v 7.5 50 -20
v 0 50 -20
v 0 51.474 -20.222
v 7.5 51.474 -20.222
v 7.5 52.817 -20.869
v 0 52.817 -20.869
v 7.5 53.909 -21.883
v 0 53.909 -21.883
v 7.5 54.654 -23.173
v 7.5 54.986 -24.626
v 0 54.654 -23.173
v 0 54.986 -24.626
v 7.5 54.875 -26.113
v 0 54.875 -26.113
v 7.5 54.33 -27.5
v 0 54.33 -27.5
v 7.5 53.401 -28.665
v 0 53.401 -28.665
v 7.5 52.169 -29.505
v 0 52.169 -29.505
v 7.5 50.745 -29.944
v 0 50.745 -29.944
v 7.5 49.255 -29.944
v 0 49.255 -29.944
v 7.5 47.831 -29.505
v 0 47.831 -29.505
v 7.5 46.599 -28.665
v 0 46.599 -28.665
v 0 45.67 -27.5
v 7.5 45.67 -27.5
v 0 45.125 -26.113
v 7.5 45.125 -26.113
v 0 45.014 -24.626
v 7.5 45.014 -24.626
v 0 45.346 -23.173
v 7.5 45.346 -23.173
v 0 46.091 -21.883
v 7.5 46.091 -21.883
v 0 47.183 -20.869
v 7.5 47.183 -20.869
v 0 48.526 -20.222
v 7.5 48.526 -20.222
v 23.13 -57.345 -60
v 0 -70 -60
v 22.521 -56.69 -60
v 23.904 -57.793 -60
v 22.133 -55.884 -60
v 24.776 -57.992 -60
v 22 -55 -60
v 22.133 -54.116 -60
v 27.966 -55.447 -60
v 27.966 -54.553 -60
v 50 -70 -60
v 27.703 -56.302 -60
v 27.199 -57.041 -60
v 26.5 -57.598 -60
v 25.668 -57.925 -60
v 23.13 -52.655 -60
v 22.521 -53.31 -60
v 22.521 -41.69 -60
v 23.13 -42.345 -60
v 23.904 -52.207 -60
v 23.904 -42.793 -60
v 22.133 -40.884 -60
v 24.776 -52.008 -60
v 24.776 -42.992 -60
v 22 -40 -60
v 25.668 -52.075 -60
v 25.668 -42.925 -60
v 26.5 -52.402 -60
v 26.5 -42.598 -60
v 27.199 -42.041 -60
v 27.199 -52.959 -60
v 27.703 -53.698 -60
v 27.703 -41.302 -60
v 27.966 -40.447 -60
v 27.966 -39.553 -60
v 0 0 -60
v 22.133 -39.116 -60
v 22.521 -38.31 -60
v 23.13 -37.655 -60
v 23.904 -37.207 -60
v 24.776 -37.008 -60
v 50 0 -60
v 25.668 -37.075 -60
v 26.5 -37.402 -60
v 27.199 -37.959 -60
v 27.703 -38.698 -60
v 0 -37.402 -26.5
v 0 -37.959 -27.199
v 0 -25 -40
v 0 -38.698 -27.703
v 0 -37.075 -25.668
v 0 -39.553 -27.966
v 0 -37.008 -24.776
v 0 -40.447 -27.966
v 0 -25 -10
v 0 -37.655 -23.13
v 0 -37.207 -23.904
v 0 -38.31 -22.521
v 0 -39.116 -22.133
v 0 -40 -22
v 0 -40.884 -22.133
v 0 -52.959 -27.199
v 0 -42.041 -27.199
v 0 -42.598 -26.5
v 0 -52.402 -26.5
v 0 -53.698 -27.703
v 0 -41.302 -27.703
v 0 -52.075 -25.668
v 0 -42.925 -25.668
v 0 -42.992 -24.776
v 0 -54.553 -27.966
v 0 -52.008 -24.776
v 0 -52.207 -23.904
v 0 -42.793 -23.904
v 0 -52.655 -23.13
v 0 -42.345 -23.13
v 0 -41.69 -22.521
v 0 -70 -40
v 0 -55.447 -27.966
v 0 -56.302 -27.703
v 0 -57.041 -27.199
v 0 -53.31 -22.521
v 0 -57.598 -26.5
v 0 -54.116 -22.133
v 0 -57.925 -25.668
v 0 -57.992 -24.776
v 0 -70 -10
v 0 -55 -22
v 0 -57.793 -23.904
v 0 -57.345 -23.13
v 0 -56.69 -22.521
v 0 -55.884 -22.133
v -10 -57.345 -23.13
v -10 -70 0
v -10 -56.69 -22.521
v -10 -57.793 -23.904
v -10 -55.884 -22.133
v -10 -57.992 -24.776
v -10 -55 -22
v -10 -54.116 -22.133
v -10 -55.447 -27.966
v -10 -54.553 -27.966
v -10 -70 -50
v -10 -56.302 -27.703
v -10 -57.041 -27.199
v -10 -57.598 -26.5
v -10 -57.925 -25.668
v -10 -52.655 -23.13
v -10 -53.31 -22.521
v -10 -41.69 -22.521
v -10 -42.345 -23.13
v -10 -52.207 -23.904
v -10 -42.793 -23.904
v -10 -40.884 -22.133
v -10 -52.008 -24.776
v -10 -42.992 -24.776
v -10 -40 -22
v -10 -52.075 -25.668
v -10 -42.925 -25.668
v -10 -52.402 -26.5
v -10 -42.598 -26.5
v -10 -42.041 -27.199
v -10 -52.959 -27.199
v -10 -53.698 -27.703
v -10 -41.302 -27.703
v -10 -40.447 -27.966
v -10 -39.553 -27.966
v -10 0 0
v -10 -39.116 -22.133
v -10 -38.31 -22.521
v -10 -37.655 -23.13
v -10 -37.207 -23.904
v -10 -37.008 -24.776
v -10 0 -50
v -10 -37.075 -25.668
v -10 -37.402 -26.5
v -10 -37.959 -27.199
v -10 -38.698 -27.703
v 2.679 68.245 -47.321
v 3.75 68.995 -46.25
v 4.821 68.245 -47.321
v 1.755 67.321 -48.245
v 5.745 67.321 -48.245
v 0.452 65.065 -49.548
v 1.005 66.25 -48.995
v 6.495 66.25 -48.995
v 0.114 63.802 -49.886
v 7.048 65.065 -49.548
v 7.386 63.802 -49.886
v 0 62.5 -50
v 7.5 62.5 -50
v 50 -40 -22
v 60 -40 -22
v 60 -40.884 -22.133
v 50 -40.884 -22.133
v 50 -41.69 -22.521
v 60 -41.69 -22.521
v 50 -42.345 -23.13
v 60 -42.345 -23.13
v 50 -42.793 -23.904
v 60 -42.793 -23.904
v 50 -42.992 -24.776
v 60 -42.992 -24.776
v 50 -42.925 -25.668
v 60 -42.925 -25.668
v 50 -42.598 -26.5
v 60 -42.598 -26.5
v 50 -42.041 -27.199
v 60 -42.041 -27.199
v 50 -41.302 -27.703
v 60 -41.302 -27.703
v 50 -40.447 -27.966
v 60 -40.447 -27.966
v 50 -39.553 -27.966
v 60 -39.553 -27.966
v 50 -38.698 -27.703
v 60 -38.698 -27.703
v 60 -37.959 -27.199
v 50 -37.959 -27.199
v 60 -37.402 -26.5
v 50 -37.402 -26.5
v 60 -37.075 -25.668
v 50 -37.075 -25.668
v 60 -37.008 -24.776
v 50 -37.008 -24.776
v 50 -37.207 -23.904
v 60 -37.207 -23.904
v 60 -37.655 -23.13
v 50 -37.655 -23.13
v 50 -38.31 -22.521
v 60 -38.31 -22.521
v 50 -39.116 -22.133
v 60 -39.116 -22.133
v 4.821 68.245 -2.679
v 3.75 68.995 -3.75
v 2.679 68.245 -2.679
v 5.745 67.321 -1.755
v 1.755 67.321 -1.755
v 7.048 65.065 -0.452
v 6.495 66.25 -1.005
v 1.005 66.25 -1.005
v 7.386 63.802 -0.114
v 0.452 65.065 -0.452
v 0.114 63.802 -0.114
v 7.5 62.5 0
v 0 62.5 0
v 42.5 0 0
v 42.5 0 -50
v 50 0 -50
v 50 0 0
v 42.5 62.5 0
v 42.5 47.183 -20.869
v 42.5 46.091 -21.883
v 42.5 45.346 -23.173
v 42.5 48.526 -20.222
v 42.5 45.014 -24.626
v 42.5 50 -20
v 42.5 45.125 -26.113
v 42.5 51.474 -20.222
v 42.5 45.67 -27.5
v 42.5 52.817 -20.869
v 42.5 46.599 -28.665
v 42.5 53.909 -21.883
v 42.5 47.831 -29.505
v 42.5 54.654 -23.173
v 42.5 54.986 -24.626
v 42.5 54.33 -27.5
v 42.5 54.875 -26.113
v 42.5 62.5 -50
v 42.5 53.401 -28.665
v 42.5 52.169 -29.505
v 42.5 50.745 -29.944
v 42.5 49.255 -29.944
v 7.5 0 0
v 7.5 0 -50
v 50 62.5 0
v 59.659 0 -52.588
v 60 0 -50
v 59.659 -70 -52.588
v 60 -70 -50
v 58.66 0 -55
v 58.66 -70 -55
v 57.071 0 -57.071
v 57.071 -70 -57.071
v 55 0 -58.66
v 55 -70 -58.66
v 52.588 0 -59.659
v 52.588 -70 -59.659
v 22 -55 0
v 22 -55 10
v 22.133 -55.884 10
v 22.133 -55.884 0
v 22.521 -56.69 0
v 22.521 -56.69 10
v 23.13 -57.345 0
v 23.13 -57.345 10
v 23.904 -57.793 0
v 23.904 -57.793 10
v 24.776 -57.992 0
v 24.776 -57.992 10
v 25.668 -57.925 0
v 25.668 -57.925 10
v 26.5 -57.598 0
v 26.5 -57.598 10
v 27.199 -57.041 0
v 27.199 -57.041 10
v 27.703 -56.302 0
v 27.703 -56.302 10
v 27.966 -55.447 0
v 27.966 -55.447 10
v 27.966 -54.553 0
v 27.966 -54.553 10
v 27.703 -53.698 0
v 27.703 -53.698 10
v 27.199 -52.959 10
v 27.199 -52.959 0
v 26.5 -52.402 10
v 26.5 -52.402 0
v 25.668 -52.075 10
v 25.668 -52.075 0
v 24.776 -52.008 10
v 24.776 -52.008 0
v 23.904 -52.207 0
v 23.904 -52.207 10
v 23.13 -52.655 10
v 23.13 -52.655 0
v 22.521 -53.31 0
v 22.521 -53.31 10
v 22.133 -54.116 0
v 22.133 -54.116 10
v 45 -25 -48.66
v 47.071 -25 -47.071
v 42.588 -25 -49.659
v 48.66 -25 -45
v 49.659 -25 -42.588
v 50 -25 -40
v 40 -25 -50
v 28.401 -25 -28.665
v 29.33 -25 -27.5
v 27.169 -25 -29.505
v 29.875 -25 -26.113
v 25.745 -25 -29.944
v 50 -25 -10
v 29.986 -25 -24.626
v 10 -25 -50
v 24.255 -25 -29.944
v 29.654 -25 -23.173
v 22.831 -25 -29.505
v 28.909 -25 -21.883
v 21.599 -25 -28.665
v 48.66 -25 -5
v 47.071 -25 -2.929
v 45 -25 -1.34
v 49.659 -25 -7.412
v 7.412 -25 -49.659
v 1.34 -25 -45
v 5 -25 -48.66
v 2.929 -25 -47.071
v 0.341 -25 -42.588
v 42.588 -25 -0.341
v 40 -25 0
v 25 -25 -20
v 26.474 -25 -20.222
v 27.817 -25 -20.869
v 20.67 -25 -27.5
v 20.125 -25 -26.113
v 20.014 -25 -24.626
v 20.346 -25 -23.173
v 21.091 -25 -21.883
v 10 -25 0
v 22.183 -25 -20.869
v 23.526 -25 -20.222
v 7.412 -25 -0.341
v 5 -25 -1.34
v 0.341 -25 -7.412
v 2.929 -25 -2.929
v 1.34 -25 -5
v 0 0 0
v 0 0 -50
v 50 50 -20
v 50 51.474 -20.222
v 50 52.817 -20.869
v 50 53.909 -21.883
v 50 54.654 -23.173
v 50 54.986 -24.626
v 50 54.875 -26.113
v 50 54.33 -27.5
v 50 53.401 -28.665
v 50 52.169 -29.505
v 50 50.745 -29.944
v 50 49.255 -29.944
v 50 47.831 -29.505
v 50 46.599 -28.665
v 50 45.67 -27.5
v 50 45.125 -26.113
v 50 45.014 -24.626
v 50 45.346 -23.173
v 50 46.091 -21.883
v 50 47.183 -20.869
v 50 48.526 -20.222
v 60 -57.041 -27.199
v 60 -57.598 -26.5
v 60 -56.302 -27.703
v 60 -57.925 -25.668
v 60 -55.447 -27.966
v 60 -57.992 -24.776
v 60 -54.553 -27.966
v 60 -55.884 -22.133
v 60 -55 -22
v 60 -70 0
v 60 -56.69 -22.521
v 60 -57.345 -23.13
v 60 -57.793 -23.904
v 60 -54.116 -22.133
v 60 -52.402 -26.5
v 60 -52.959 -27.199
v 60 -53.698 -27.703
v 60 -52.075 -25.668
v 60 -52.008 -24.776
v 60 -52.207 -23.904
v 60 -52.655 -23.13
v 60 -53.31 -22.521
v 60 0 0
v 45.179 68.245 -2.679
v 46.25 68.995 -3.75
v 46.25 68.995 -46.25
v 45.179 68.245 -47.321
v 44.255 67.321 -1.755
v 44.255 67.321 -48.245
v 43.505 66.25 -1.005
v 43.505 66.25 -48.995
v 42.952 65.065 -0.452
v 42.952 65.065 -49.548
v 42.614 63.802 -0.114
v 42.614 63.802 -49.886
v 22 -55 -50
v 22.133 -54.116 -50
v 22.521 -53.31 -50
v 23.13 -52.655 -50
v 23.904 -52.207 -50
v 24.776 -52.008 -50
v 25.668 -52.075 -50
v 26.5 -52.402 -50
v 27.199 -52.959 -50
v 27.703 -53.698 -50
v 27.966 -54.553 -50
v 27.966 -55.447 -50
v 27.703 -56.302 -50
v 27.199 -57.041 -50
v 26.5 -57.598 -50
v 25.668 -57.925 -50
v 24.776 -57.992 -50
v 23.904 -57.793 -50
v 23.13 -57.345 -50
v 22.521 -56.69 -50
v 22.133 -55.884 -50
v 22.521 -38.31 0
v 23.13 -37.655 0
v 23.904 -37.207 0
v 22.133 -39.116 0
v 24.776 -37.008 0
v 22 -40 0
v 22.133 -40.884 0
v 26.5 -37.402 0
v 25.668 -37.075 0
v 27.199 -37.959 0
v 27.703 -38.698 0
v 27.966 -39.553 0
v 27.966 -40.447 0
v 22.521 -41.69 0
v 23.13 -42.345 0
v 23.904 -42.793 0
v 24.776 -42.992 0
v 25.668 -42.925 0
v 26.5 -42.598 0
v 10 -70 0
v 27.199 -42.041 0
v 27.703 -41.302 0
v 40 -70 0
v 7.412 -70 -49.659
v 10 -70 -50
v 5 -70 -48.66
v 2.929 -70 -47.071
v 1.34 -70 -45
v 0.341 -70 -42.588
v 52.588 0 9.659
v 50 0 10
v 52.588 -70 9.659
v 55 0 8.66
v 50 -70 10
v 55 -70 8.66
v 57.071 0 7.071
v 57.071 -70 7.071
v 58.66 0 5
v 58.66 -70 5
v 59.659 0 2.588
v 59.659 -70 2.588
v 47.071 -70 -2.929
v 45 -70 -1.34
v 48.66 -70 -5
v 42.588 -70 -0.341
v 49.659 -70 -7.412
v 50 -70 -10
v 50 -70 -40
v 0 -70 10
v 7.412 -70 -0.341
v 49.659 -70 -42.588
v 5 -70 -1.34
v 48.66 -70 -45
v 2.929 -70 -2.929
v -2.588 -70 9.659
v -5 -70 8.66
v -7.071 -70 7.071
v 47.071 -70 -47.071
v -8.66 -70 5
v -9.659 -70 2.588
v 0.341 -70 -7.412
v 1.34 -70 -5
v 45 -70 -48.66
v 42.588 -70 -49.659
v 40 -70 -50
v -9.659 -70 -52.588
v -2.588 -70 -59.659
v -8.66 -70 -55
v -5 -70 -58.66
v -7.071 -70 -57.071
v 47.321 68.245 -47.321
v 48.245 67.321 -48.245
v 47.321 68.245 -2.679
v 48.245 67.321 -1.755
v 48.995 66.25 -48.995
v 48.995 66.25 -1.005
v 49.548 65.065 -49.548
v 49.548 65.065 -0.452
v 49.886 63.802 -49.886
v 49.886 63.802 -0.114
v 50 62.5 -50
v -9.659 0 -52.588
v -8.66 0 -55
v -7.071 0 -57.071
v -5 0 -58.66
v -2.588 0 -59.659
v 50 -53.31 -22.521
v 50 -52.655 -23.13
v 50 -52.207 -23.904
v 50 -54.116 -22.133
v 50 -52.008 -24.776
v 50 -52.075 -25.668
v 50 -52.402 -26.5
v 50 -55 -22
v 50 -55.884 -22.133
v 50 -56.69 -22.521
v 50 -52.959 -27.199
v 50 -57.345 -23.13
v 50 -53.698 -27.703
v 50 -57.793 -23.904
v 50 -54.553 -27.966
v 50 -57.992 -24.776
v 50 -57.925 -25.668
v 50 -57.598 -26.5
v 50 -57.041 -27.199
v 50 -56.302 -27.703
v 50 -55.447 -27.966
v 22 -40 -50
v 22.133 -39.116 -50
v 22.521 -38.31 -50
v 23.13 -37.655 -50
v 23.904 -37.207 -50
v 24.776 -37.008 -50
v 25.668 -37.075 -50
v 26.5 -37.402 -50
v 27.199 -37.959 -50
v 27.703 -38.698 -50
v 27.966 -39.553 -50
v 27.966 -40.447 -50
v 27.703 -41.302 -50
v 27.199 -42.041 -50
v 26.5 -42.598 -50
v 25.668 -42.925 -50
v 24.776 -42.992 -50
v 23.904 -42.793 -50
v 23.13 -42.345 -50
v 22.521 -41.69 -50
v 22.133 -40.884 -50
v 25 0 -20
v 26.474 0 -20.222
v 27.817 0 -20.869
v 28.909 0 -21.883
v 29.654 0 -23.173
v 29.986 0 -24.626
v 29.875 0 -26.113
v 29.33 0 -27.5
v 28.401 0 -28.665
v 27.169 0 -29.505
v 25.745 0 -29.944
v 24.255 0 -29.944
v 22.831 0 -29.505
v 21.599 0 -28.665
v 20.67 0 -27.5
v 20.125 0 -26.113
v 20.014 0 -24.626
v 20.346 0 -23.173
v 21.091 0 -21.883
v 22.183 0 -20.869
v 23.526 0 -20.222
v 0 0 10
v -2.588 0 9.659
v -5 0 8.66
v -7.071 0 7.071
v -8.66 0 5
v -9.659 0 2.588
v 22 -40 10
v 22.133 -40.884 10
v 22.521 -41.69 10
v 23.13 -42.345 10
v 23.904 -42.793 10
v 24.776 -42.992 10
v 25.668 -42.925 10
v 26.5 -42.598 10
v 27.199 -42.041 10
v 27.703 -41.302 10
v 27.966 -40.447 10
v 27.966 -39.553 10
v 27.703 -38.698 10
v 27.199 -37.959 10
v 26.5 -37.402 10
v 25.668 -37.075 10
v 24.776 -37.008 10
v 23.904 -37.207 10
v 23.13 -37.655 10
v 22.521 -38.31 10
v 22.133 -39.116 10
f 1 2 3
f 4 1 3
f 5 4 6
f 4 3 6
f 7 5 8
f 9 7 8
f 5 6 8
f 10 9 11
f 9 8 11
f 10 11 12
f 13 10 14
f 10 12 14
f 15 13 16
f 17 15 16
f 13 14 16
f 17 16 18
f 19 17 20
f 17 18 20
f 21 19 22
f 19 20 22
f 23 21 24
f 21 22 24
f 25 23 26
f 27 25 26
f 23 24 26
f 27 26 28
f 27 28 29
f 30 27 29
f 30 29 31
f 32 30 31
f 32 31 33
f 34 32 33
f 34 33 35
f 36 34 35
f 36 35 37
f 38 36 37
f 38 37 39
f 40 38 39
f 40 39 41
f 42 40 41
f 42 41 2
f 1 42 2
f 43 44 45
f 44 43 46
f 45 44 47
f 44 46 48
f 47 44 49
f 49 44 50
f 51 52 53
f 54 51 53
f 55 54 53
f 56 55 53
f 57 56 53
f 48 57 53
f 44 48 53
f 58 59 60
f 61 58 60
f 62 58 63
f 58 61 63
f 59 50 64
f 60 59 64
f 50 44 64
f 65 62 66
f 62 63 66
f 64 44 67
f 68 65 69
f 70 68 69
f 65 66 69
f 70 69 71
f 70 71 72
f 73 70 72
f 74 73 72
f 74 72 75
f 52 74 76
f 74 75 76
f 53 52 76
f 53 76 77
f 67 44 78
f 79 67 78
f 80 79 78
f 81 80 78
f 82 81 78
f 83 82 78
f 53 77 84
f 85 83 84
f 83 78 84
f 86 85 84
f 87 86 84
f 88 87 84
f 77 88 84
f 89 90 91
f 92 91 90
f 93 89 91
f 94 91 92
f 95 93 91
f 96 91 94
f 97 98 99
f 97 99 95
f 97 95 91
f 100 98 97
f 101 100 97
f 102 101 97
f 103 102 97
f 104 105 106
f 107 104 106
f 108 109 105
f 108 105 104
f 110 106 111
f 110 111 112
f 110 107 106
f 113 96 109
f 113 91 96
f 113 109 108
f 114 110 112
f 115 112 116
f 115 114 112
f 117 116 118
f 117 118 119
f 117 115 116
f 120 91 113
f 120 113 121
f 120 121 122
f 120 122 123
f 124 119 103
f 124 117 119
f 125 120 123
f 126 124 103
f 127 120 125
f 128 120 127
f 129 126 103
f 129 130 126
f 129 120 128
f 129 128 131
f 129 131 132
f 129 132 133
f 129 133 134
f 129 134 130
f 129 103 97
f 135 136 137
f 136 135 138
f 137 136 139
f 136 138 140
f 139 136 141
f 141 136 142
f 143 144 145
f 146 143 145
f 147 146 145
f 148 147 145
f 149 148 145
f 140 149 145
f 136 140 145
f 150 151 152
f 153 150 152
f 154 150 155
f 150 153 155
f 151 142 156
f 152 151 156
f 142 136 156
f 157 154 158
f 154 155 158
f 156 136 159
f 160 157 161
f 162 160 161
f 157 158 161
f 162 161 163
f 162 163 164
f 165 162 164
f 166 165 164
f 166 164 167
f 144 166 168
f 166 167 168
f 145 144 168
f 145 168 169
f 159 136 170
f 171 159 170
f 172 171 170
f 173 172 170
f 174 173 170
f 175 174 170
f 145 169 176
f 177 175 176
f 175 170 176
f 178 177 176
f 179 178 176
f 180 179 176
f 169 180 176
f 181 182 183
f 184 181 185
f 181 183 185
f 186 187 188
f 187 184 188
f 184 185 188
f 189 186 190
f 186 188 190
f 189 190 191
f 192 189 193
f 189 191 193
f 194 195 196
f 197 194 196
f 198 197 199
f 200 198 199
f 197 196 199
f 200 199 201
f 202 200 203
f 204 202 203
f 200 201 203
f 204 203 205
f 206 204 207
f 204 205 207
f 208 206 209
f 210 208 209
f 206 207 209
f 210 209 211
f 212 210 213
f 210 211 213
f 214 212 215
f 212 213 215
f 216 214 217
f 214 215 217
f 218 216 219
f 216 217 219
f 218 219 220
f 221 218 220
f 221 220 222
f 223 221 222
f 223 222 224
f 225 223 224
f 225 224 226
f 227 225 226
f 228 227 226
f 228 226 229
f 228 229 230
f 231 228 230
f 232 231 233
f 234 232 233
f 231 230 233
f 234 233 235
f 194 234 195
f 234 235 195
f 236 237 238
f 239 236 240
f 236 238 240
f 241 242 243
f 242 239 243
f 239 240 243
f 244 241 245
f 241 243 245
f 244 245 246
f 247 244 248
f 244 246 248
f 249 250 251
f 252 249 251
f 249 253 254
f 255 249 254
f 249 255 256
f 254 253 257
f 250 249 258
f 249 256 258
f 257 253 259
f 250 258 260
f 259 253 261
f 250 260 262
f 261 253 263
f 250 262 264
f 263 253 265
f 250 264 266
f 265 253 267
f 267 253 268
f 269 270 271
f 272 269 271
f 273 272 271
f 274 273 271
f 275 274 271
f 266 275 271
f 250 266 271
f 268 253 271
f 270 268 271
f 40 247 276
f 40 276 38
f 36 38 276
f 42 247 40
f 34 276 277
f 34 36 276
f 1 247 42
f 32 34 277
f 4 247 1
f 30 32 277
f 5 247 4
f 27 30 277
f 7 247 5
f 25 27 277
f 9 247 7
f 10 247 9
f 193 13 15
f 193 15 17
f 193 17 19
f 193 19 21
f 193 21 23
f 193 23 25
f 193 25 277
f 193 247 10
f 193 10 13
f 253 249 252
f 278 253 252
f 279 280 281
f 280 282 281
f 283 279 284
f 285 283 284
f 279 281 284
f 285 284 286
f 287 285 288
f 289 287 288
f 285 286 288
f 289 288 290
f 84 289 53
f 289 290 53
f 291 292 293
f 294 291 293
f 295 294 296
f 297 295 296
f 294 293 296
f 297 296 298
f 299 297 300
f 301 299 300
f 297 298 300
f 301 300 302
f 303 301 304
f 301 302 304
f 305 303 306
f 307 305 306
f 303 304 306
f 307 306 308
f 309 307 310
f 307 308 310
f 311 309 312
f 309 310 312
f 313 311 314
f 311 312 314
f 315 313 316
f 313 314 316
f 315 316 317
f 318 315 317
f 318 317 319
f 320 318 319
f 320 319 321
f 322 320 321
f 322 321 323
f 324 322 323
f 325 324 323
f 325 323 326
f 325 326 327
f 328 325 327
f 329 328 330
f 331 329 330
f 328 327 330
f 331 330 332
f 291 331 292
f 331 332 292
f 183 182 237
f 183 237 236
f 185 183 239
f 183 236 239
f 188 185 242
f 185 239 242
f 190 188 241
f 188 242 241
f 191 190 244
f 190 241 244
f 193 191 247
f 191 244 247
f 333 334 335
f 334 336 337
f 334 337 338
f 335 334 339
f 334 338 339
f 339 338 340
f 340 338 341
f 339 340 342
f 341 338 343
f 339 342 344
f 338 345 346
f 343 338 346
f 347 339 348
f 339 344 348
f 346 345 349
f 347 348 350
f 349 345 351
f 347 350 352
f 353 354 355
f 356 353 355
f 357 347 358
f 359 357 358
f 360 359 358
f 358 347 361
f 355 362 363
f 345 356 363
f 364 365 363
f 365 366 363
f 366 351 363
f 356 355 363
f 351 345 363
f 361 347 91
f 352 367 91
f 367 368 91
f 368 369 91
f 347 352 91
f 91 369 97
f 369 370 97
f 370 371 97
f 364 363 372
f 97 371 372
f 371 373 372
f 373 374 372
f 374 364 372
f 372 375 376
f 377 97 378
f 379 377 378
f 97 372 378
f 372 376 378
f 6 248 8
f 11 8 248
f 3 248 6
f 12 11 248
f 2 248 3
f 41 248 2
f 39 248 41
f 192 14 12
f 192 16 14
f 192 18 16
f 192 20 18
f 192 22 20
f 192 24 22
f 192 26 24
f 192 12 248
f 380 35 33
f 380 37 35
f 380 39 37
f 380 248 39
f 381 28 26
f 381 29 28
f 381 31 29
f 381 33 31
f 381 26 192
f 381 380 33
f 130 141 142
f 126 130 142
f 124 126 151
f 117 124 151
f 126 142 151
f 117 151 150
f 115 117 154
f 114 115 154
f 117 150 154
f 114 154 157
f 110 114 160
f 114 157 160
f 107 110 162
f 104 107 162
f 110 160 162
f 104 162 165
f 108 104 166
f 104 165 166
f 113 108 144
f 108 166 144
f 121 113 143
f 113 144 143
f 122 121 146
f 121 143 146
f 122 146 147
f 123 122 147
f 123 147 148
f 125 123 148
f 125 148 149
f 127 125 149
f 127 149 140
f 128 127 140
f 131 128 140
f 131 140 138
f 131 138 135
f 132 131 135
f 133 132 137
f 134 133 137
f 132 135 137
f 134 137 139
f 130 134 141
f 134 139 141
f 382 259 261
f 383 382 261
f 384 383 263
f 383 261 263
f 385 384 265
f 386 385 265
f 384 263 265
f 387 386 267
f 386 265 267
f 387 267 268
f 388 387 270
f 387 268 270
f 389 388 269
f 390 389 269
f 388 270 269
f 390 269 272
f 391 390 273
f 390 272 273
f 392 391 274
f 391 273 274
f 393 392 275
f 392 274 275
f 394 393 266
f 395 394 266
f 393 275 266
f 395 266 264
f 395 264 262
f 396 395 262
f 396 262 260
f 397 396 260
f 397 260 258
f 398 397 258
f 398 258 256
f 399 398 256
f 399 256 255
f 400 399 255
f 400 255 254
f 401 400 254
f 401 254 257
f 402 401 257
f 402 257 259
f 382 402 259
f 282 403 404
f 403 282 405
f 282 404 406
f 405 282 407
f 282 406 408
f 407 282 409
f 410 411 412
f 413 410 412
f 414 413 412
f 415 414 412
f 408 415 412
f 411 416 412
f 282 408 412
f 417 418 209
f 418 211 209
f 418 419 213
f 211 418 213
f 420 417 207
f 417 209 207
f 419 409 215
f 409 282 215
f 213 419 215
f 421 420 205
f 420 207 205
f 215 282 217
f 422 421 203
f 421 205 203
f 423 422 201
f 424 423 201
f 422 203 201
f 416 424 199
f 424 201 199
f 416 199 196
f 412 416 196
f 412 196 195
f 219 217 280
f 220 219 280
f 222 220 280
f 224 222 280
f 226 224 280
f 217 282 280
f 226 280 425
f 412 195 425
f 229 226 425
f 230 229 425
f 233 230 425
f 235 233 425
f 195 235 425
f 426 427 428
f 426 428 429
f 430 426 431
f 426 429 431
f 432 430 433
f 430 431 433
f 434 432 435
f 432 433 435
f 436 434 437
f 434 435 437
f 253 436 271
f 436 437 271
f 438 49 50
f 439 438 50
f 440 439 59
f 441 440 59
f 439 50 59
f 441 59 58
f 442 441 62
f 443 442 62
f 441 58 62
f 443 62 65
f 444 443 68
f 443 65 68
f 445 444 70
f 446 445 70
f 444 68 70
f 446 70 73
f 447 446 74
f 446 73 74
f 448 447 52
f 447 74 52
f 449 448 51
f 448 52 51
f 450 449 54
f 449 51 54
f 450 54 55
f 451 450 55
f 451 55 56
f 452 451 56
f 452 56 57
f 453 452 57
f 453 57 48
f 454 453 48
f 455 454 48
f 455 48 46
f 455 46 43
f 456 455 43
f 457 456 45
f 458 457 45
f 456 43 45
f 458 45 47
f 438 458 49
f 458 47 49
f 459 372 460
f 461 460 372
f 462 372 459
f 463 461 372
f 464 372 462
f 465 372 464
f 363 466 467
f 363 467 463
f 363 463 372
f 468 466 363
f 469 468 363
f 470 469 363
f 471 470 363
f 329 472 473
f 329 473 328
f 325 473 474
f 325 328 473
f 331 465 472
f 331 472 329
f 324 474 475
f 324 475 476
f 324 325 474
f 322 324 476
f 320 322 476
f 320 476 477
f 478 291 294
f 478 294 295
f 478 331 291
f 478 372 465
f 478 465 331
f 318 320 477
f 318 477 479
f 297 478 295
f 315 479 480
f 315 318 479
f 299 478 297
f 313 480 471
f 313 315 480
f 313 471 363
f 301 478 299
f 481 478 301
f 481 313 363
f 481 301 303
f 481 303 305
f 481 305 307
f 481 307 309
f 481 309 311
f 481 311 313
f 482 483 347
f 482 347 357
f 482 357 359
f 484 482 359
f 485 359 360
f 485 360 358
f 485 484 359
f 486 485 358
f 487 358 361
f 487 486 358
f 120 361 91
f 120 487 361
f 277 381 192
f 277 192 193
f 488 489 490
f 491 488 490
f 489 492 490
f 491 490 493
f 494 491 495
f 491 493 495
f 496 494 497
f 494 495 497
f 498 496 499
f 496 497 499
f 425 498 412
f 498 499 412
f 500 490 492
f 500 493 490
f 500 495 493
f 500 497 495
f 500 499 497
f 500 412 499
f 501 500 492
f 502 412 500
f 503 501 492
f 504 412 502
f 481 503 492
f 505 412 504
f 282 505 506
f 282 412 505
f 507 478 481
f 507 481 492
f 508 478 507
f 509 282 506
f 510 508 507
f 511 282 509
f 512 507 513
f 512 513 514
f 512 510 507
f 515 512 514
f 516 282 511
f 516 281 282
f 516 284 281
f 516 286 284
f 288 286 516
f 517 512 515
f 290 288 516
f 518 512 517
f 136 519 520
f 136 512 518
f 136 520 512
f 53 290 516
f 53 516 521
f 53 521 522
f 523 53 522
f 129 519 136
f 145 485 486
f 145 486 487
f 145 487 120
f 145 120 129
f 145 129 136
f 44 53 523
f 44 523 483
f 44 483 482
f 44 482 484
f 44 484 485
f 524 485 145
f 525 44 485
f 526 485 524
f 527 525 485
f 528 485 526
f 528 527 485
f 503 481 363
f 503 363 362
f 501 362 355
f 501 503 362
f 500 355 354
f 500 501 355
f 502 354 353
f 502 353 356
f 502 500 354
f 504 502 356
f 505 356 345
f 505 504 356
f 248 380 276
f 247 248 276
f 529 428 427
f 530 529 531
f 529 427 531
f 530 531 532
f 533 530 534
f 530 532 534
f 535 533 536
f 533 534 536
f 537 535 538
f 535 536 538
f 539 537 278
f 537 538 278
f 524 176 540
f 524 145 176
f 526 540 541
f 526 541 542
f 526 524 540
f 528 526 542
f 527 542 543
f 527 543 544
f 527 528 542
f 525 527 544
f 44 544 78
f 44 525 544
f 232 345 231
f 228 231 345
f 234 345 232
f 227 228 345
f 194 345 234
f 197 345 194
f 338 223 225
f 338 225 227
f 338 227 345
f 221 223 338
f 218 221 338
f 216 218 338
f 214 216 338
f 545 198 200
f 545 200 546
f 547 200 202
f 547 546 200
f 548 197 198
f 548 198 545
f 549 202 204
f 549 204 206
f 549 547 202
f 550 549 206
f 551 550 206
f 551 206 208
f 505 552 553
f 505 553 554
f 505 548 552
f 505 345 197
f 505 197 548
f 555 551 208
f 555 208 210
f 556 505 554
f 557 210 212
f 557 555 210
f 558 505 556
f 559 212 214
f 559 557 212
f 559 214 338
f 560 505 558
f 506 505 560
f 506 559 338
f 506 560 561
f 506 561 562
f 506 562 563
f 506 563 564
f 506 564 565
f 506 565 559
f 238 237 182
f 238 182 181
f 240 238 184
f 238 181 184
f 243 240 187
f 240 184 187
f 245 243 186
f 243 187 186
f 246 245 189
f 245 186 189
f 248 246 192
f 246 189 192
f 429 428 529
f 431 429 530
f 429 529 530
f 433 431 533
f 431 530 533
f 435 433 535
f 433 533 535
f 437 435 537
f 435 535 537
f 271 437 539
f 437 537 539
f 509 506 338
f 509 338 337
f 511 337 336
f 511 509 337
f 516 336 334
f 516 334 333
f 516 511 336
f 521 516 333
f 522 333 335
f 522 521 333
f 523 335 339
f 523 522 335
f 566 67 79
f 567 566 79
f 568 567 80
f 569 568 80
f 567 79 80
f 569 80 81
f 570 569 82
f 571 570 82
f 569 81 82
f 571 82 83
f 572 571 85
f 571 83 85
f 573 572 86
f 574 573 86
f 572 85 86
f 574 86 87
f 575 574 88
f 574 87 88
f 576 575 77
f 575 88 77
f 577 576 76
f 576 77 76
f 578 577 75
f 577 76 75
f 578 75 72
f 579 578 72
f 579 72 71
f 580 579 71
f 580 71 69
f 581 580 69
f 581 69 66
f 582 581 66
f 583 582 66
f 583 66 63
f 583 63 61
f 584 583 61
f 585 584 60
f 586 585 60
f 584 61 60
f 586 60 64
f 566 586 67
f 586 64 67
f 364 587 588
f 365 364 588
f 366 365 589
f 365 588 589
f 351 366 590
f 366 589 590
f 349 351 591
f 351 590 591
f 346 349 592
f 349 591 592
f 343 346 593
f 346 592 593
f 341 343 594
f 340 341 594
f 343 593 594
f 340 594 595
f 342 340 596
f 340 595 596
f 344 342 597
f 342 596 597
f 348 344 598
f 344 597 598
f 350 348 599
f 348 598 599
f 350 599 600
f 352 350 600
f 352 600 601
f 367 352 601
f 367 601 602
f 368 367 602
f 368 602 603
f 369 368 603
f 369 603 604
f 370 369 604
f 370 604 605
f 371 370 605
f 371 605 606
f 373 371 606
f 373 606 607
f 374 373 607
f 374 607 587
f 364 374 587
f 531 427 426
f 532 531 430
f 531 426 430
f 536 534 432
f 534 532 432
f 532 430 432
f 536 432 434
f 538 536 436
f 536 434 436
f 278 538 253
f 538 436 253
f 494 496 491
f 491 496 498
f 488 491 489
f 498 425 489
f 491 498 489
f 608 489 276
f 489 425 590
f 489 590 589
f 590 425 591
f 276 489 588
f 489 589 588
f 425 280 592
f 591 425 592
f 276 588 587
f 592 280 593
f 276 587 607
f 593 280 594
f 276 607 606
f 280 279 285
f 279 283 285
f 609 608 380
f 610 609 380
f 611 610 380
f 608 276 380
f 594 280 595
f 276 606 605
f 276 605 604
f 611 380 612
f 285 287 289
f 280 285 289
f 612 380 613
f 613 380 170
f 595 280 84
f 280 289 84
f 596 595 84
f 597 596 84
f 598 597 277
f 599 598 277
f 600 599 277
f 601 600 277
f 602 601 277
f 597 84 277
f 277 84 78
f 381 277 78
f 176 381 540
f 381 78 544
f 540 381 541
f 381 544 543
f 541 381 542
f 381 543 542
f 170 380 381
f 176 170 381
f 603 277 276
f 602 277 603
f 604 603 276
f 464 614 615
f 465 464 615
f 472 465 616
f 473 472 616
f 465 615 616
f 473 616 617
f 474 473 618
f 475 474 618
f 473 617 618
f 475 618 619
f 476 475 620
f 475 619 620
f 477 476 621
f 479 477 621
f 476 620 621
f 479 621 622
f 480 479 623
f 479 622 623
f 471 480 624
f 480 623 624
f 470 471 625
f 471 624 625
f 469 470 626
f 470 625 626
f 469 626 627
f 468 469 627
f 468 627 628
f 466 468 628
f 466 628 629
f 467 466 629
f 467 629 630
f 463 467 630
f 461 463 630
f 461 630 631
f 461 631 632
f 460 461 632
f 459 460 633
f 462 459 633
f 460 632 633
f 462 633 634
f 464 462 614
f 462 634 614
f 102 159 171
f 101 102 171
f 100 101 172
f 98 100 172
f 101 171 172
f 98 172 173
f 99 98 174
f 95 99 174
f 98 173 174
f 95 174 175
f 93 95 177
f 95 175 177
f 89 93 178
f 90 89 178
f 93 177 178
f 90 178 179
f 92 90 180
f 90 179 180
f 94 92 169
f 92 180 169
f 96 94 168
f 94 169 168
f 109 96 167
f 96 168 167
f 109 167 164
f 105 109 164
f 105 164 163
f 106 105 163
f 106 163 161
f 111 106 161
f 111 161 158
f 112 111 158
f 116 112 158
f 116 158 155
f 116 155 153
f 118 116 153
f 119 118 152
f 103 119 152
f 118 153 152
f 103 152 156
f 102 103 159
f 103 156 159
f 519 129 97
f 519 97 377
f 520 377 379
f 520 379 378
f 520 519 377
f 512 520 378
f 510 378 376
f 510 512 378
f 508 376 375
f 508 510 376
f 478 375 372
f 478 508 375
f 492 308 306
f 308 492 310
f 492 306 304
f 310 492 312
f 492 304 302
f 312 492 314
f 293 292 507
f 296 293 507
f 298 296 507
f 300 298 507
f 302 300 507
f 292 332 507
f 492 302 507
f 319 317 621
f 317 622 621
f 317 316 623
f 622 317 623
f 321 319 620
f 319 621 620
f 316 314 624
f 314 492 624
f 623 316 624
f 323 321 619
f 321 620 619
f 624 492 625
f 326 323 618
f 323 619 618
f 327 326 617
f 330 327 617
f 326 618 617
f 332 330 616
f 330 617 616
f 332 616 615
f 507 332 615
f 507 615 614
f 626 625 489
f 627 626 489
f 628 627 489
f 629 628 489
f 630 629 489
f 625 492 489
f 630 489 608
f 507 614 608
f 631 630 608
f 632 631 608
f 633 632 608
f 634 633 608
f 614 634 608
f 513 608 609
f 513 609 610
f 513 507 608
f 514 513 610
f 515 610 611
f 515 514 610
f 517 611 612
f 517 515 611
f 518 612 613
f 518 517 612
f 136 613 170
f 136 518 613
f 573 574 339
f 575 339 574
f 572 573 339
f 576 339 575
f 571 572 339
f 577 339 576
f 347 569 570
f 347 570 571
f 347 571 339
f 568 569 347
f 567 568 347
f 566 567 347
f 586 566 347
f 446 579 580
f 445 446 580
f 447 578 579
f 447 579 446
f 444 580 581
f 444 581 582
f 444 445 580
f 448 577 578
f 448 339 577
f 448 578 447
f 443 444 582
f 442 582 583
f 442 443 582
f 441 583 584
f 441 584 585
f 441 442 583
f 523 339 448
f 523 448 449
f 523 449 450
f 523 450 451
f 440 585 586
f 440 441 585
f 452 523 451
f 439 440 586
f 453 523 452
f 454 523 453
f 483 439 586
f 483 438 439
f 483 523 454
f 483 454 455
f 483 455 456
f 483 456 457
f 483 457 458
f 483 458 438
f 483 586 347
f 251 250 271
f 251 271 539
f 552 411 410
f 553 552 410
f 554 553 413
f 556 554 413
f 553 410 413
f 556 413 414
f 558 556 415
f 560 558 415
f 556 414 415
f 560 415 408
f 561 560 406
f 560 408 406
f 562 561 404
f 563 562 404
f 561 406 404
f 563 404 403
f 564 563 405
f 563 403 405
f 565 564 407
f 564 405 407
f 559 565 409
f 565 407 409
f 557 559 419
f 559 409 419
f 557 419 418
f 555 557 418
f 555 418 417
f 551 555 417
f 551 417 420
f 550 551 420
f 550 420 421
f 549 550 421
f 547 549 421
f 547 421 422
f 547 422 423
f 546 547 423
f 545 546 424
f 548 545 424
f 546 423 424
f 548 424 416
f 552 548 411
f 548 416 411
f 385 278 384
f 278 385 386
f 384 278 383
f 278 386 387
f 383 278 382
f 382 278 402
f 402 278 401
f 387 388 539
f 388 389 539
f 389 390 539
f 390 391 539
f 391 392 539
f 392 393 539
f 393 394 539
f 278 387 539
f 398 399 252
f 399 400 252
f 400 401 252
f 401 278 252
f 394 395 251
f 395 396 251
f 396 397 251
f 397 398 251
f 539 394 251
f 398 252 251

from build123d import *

# Parameters (mm, degrees)
SKETCH1_W           = 50
SKETCH1_H           = 50
BOSS_EXTRUDE1_DEPTH = 70
SKETCH3_W           = 35
SKETCH3_H           = 50
CUT_EXTRUDE1_DEPTH  = 120
SKETCH4_R           = 5
CUT_EXTRUDE2_DEPTH  = 14
FILLET2_R           = 7.5
BOSS_EXTRUDE2_DEPTH = 70
FILLET4_R           = 10
CUT_EXTRUDE10_DEPTH = 45
SKETCH10_R          = 3
CUT_EXTRUDE6_DEPTH  = 10
SKETCH12_R          = 3
CUT_EXTRUDE7_DEPTH  = 10
SKETCH13_R          = 3
CUT_EXTRUDE8_DEPTH  = 10
SKETCH14_R          = 3
CUT_EXTRUDE9_DEPTH  = 10
FILLET5_R           = 7.5
SKETCH16_R          = 5
CUT_EXTRUDE12_DEPTH = 10
SKETCH17_R          = 5
CUT_EXTRUDE13_DEPTH = 50


with BuildPart() as part:
    # Sketch1 → Boss-Extrude1 (new body)
    with BuildSketch(Plane(origin=(0, 0, 0), x_dir=(1, 0, 0), z_dir=(0, 1, 0))):
        with Locations((25, 25)):
            Rectangle(SKETCH1_W, SKETCH1_H)
    extrude(amount=BOSS_EXTRUDE1_DEPTH)

    # Sketch3 → Cut-Extrude1 (cut)
    with BuildSketch(Plane(origin=(0, 70, 0), x_dir=(1, 0, 0), z_dir=(0, 1, 0))):
        with Locations((25, 25)):
            Rectangle(SKETCH3_W, SKETCH3_H)
    extrude(amount=-CUT_EXTRUDE1_DEPTH, mode=Mode.SUBTRACT)


with BuildPart() as cut_extrude1_piece_1:
    # of the separate pieces the step leaves, piece 1, a body of its own (cut_extrude1_pieces)
    add(part.part.solids().sort_by_distance((42.5, 0, 0))[0])

    # Fillet2
    # the kernel refuses this fillet: 7.5 mm, written as the material it takes off along each edge
    with BuildSketch(Plane(origin=(50, 70, 18.75), x_dir=(0, -1, 0), z_dir=(0, 0, -1))) as fillet2_piece_1:
        with BuildLine():
            CenterArc((FILLET2_R, FILLET2_R), FILLET2_R, 180, 90)
            Line((0, FILLET2_R), (0, 0))
            Line((0, 0), (FILLET2_R, 0))
        make_face()
    extrude(amount=87.5, mode=Mode.SUBTRACT)
    with BuildSketch(Plane(origin=(23.75, 70, 0), x_dir=(0, -1, 0), z_dir=(1, 0, 0))) as fillet2_piece_2:
        with BuildLine():
            CenterArc((FILLET2_R, FILLET2_R), FILLET2_R, 180, 90)
            Line((0, FILLET2_R), (0, 0))
            Line((0, 0), (FILLET2_R, 0))
        make_face()
    extrude(amount=45, mode=Mode.SUBTRACT)
    with BuildSketch(Plane(origin=(68.75, 70, -50), x_dir=(0, 0, 1), z_dir=(-1, 0, 0))) as fillet2_piece_3:
        with BuildLine():
            CenterArc((FILLET2_R, -FILLET2_R), FILLET2_R, 90, 90)
            Line((0, -FILLET2_R), (0, 0))
            Line((0, 0), (FILLET2_R, 0))
        make_face()
    extrude(amount=45, mode=Mode.SUBTRACT)
    with BuildSketch(Plane(origin=(42.5, 70, -68.75), x_dir=(1, 0, 0), z_dir=(0, 0, 1))) as fillet2_piece_4:
        with BuildLine():
            CenterArc((FILLET2_R, -FILLET2_R), FILLET2_R, 90, 90)
            Line((0, -FILLET2_R), (0, 0))
            Line((0, 0), (FILLET2_R, 0))
        make_face()
    extrude(amount=87.5, mode=Mode.SUBTRACT)

    # Sketch16 → Cut-Extrude12 (cut)
    with BuildSketch(Plane.ZY.offset(-42.5)):
        with Locations((-25, 50)):
            Circle(SKETCH16_R)
    extrude(amount=-CUT_EXTRUDE12_DEPTH, mode=Mode.SUBTRACT)


with BuildPart() as cut_extrude1_piece_2:
    # of the separate pieces the step leaves, piece 2, a body of its own (cut_extrude1_pieces)
    add(part.part.solids().sort_by_distance((0, 0, 0))[0])

    # Sketch4 → Cut-Extrude2 (cut)
    with BuildSketch(Plane.ZY):
        with Locations((-25, 50)):
            Circle(SKETCH4_R)
    extrude(amount=-CUT_EXTRUDE2_DEPTH, mode=Mode.SUBTRACT)

    # Sketch6 → Boss-Extrude2 (add)
    with BuildSketch(Plane(origin=(0, 0, 0), x_dir=(-1, 0, 0), z_dir=(0, -1, 0))):
        Polygon((-60, 0), (-60, -10), (10, -10), (10, 60), (-60, 60), align=None)
    extrude(amount=BOSS_EXTRUDE2_DEPTH)

    # Fillet4
    fillet4_edges = [cut_extrude1_piece_2.edges().sort_by_distance(p)[0] for p in [
        (60, -35, -60),
        (60, -35, 10),
        (-10, -35, 10),
        (-10, -35, -60),
    ]]
    fillet(fillet4_edges, radius=FILLET4_R)

    # Sketch15 → Cut-Extrude10 (cut)
    with BuildSketch(Plane.XZ.offset(70)):
        with BuildLine():
            Line((10, 0), (40, 0))
            ThreePointArc((40, 0), (47.071067812, -2.928932188), (50, -10))
            Line((50, -10), (50, -40))
            ThreePointArc((50, -40), (47.071067812, -47.071067812), (40, -50))
            Line((40, -50), (10, -50))
            ThreePointArc((10, -50), (2.928932188, -47.071067812), (0, -40))
            Line((0, -40), (0, -10))
            ThreePointArc((0, -10), (2.928932188, -2.928932188), (10, 0))
        make_face()
    extrude(amount=-CUT_EXTRUDE10_DEPTH, mode=Mode.SUBTRACT)

    # Sketch10 → Cut-Extrude6 (cut)
    with BuildSketch(Plane.ZY.offset(10)):
        with Locations((-25, -40)):
            Circle(SKETCH10_R)
        with Locations((-25, -55)):
            Circle(SKETCH10_R)
    extrude(amount=-CUT_EXTRUDE6_DEPTH, mode=Mode.SUBTRACT)

    # Sketch12 → Cut-Extrude7 (cut)
    with BuildSketch(Plane(origin=(0, 0, -60), x_dir=(-1, 0, 0), z_dir=(0, 0, -1))):
        with Locations((-25, -40)):
            Circle(SKETCH12_R)
        with Locations((-25, -55)):
            Circle(SKETCH12_R)
    extrude(amount=-CUT_EXTRUDE7_DEPTH, mode=Mode.SUBTRACT)

    # Sketch13 → Cut-Extrude8 (cut)
    with BuildSketch(Plane(origin=(60, 0, 0), x_dir=(0, 0, -1), z_dir=(1, 0, 0))):
        with Locations(Location((25, -40, 0), (0, 0, 180))):
            Circle(SKETCH13_R)
        with Locations(Location((25, -55, 0), (0, 0, 180))):
            Circle(SKETCH13_R)
    extrude(amount=-CUT_EXTRUDE8_DEPTH, mode=Mode.SUBTRACT)

    # Sketch14 → Cut-Extrude9 (cut)
    with BuildSketch(Plane.XY.offset(10)):
        with Locations(Location((25, -40, 0), (0, 0, 180))):
            Circle(SKETCH14_R)
        with Locations(Location((25, -55, 0), (0, 0, 180))):
            Circle(SKETCH14_R)
    extrude(amount=-CUT_EXTRUDE9_DEPTH, mode=Mode.SUBTRACT)

    # Fillet5
    # the kernel refuses this fillet: 7.5 mm, written as the material it takes off along each edge
    with BuildSketch(Plane(origin=(26.25, 70, -50), x_dir=(0, -1, 0), z_dir=(-1, 0, 0)), Plane(origin=(-18.75, 70, 0), x_dir=(0, -1, 0), z_dir=(1, 0, 0))) as fillet5_piece_1:
        with BuildLine():
            CenterArc((FILLET5_R, FILLET5_R), FILLET5_R, 180, 90)
            Line((0, FILLET5_R), (0, 0))
            Line((0, 0), (FILLET5_R, 0))
        make_face()
    extrude(amount=45, mode=Mode.SUBTRACT)
    with BuildSketch(Plane(origin=(0, 70, -68.75), x_dir=(0, -1, 0), z_dir=(0, 0, 1)), Plane(origin=(7.5, 70, 18.75), x_dir=(0, -1, 0), z_dir=(0, 0, -1))) as fillet5_piece_2:
        with BuildLine():
            CenterArc((FILLET5_R, FILLET5_R), FILLET5_R, 180, 90)
            Line((0, FILLET5_R), (0, 0))
            Line((0, 0), (FILLET5_R, 0))
        make_face()
    extrude(amount=87.5, mode=Mode.SUBTRACT)

    # Sketch17 → Cut-Extrude13 (cut)
    with BuildSketch(Plane(origin=(0, 0, 0), x_dir=(1, 0, 0), z_dir=(0, 1, 0))):
        with Locations(Location((25, 25, 0), (0, 0, 270))):
            Circle(SKETCH17_R)
    extrude(amount=-CUT_EXTRUDE13_DEPTH, mode=Mode.SUBTRACT)


solid = Compound([cut_extrude1_piece_1.part, cut_extrude1_piece_2.part])
